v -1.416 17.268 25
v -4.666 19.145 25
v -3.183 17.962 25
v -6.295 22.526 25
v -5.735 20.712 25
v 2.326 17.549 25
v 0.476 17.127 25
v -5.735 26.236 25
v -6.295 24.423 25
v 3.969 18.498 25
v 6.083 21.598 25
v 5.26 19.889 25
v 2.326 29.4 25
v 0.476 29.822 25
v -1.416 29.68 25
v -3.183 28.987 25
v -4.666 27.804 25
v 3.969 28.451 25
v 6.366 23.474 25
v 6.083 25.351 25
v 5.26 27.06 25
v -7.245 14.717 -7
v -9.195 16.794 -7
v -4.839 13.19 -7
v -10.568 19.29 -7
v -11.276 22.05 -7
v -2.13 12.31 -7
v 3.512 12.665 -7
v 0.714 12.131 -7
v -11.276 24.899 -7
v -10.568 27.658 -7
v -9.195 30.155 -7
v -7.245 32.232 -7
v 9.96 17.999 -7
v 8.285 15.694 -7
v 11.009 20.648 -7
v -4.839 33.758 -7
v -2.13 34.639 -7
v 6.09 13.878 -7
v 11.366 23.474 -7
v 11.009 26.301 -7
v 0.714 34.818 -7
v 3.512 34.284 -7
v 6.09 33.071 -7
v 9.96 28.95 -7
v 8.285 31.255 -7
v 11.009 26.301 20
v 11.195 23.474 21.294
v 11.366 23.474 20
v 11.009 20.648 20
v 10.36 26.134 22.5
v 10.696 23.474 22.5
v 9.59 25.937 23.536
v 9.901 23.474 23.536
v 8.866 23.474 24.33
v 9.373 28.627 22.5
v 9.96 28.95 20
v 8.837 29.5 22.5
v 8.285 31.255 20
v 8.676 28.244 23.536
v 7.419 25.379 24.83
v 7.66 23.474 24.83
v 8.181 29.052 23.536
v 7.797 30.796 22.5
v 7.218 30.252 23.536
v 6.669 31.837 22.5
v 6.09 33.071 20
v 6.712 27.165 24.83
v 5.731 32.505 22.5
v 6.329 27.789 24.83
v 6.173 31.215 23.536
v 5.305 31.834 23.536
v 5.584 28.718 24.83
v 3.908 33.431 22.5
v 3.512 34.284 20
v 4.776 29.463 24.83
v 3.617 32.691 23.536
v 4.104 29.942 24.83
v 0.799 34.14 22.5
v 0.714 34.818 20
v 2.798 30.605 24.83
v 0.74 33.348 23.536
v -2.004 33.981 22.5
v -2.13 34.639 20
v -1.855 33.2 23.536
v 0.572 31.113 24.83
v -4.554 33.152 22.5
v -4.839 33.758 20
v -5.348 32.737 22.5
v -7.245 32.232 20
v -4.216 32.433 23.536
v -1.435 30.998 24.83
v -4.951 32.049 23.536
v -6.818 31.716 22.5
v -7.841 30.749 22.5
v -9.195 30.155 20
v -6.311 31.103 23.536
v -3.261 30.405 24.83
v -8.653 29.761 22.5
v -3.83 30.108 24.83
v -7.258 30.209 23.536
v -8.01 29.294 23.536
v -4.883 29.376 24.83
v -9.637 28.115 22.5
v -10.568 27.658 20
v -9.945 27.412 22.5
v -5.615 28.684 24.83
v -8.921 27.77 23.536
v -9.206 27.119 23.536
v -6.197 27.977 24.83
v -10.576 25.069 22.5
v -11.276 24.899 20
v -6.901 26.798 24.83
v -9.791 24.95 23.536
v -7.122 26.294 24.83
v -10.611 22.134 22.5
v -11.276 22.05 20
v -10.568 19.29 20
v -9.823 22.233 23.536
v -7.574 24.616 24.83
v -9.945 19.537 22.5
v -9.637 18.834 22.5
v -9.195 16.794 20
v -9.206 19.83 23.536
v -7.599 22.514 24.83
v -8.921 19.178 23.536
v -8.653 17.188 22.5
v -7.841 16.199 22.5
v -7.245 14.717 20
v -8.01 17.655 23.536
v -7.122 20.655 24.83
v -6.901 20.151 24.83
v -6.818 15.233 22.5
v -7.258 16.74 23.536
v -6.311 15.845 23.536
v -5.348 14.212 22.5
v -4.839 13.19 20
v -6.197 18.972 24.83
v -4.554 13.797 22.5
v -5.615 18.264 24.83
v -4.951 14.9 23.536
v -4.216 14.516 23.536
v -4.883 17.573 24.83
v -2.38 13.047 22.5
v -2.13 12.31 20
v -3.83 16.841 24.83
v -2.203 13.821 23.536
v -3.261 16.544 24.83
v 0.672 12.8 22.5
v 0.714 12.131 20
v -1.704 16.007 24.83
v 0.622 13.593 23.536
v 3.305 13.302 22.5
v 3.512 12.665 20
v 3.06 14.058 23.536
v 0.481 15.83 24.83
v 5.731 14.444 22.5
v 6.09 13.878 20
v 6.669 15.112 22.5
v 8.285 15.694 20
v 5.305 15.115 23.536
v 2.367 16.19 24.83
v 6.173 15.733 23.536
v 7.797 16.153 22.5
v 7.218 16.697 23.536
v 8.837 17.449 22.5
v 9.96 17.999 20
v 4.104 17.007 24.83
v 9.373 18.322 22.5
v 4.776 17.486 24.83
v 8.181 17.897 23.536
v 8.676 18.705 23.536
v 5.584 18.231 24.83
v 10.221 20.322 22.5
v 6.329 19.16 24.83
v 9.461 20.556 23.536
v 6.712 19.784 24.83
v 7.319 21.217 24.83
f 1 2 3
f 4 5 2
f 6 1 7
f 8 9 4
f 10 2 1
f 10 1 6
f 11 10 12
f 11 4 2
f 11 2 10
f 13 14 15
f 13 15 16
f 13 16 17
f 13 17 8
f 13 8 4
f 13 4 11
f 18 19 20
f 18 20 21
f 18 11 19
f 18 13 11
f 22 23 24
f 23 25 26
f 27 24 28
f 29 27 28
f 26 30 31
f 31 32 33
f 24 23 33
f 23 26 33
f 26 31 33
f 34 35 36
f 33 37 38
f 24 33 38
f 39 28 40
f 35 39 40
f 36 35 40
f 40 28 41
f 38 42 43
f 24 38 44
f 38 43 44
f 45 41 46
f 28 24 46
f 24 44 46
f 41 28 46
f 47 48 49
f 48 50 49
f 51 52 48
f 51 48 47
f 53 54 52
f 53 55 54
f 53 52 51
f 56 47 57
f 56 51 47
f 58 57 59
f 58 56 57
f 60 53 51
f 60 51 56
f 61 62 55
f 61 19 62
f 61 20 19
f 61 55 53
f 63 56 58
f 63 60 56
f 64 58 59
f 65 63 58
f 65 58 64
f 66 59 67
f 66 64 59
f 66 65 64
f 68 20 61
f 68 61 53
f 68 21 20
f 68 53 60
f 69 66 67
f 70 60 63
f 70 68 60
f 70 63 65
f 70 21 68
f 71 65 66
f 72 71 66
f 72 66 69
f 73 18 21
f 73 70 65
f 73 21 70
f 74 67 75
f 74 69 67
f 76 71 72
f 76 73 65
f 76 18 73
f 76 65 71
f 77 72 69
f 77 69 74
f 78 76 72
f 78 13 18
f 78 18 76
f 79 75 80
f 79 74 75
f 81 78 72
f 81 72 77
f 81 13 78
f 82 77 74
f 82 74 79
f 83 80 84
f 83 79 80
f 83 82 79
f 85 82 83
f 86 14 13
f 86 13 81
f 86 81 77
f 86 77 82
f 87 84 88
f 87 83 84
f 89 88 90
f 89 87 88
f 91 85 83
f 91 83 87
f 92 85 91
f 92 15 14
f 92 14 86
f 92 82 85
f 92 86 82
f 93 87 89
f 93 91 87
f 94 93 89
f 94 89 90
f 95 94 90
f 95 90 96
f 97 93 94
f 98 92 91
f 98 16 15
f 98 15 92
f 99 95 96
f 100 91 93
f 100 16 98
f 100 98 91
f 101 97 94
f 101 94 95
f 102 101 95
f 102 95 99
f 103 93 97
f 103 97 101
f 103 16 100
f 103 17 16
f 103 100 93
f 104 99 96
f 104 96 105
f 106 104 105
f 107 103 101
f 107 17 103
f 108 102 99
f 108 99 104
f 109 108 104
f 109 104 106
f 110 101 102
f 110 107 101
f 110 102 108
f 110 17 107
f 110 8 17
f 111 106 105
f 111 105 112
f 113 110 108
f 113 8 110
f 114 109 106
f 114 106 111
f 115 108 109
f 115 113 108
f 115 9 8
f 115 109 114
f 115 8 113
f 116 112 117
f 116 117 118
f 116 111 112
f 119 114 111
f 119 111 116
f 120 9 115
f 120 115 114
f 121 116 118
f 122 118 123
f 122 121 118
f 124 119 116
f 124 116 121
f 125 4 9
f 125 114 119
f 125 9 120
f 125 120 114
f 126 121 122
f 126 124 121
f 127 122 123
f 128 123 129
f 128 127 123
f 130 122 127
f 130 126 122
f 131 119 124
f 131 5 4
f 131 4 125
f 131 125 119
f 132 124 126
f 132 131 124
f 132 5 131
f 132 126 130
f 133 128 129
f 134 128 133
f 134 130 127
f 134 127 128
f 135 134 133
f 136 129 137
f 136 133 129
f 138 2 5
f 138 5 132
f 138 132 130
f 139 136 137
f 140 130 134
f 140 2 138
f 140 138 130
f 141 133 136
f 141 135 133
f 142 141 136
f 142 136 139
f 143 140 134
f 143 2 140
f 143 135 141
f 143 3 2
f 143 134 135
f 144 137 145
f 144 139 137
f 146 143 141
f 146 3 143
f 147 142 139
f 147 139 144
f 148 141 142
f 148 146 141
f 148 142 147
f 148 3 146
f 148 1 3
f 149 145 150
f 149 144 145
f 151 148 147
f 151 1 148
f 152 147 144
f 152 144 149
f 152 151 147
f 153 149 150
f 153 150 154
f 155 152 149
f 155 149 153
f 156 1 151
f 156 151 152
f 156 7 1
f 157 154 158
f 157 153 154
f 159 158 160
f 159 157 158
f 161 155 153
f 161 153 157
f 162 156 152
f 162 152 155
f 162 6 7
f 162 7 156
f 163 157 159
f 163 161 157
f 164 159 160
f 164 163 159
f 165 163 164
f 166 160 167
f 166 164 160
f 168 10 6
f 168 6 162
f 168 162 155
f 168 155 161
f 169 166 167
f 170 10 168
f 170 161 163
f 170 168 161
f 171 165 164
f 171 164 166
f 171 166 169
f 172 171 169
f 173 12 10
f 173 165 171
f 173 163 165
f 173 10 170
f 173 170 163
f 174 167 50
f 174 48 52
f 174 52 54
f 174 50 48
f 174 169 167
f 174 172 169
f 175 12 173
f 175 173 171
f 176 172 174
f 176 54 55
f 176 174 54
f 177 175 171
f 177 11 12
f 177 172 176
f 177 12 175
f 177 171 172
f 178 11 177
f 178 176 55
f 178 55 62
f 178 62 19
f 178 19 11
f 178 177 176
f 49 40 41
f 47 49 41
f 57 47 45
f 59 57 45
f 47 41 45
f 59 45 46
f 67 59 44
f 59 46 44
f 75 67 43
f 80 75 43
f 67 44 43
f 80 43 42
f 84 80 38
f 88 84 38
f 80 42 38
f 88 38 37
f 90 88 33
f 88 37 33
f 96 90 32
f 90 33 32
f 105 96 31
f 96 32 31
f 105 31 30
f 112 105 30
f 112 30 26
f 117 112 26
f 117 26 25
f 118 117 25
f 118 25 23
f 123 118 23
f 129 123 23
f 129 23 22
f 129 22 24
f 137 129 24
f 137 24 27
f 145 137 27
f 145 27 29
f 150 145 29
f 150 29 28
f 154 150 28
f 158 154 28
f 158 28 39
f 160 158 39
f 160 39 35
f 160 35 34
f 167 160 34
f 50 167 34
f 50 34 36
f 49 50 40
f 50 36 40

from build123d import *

# Parameters (mm, degrees)
F0_R     = 11.3656440934
F1_DEPTH = 25
F2_DEPTH = 32
F3_R     = 5


with BuildPart() as f1:
    # F0 (on Top) → F1 (new body)
    with BuildSketch(Plane.XY):
        with Locations((0, 23.474432528)):
            Circle(F0_R)
    extrude(amount=F1_DEPTH)

    # F2 (add): a face of the model
    f2_faces = [f1.faces().sort_by_distance(p)[0] for p in [
        (0, 23.474432528, 25),
    ]]
    extrude(f2_faces, amount=-F2_DEPTH)

    # F3
    f3_edges = [f1.edges().sort_by_distance(p)[0] for p in [
        (-11.365644, 23.474433, 25),
    ]]
    fillet(f3_edges, radius=F3_R)


solid = f1.part
